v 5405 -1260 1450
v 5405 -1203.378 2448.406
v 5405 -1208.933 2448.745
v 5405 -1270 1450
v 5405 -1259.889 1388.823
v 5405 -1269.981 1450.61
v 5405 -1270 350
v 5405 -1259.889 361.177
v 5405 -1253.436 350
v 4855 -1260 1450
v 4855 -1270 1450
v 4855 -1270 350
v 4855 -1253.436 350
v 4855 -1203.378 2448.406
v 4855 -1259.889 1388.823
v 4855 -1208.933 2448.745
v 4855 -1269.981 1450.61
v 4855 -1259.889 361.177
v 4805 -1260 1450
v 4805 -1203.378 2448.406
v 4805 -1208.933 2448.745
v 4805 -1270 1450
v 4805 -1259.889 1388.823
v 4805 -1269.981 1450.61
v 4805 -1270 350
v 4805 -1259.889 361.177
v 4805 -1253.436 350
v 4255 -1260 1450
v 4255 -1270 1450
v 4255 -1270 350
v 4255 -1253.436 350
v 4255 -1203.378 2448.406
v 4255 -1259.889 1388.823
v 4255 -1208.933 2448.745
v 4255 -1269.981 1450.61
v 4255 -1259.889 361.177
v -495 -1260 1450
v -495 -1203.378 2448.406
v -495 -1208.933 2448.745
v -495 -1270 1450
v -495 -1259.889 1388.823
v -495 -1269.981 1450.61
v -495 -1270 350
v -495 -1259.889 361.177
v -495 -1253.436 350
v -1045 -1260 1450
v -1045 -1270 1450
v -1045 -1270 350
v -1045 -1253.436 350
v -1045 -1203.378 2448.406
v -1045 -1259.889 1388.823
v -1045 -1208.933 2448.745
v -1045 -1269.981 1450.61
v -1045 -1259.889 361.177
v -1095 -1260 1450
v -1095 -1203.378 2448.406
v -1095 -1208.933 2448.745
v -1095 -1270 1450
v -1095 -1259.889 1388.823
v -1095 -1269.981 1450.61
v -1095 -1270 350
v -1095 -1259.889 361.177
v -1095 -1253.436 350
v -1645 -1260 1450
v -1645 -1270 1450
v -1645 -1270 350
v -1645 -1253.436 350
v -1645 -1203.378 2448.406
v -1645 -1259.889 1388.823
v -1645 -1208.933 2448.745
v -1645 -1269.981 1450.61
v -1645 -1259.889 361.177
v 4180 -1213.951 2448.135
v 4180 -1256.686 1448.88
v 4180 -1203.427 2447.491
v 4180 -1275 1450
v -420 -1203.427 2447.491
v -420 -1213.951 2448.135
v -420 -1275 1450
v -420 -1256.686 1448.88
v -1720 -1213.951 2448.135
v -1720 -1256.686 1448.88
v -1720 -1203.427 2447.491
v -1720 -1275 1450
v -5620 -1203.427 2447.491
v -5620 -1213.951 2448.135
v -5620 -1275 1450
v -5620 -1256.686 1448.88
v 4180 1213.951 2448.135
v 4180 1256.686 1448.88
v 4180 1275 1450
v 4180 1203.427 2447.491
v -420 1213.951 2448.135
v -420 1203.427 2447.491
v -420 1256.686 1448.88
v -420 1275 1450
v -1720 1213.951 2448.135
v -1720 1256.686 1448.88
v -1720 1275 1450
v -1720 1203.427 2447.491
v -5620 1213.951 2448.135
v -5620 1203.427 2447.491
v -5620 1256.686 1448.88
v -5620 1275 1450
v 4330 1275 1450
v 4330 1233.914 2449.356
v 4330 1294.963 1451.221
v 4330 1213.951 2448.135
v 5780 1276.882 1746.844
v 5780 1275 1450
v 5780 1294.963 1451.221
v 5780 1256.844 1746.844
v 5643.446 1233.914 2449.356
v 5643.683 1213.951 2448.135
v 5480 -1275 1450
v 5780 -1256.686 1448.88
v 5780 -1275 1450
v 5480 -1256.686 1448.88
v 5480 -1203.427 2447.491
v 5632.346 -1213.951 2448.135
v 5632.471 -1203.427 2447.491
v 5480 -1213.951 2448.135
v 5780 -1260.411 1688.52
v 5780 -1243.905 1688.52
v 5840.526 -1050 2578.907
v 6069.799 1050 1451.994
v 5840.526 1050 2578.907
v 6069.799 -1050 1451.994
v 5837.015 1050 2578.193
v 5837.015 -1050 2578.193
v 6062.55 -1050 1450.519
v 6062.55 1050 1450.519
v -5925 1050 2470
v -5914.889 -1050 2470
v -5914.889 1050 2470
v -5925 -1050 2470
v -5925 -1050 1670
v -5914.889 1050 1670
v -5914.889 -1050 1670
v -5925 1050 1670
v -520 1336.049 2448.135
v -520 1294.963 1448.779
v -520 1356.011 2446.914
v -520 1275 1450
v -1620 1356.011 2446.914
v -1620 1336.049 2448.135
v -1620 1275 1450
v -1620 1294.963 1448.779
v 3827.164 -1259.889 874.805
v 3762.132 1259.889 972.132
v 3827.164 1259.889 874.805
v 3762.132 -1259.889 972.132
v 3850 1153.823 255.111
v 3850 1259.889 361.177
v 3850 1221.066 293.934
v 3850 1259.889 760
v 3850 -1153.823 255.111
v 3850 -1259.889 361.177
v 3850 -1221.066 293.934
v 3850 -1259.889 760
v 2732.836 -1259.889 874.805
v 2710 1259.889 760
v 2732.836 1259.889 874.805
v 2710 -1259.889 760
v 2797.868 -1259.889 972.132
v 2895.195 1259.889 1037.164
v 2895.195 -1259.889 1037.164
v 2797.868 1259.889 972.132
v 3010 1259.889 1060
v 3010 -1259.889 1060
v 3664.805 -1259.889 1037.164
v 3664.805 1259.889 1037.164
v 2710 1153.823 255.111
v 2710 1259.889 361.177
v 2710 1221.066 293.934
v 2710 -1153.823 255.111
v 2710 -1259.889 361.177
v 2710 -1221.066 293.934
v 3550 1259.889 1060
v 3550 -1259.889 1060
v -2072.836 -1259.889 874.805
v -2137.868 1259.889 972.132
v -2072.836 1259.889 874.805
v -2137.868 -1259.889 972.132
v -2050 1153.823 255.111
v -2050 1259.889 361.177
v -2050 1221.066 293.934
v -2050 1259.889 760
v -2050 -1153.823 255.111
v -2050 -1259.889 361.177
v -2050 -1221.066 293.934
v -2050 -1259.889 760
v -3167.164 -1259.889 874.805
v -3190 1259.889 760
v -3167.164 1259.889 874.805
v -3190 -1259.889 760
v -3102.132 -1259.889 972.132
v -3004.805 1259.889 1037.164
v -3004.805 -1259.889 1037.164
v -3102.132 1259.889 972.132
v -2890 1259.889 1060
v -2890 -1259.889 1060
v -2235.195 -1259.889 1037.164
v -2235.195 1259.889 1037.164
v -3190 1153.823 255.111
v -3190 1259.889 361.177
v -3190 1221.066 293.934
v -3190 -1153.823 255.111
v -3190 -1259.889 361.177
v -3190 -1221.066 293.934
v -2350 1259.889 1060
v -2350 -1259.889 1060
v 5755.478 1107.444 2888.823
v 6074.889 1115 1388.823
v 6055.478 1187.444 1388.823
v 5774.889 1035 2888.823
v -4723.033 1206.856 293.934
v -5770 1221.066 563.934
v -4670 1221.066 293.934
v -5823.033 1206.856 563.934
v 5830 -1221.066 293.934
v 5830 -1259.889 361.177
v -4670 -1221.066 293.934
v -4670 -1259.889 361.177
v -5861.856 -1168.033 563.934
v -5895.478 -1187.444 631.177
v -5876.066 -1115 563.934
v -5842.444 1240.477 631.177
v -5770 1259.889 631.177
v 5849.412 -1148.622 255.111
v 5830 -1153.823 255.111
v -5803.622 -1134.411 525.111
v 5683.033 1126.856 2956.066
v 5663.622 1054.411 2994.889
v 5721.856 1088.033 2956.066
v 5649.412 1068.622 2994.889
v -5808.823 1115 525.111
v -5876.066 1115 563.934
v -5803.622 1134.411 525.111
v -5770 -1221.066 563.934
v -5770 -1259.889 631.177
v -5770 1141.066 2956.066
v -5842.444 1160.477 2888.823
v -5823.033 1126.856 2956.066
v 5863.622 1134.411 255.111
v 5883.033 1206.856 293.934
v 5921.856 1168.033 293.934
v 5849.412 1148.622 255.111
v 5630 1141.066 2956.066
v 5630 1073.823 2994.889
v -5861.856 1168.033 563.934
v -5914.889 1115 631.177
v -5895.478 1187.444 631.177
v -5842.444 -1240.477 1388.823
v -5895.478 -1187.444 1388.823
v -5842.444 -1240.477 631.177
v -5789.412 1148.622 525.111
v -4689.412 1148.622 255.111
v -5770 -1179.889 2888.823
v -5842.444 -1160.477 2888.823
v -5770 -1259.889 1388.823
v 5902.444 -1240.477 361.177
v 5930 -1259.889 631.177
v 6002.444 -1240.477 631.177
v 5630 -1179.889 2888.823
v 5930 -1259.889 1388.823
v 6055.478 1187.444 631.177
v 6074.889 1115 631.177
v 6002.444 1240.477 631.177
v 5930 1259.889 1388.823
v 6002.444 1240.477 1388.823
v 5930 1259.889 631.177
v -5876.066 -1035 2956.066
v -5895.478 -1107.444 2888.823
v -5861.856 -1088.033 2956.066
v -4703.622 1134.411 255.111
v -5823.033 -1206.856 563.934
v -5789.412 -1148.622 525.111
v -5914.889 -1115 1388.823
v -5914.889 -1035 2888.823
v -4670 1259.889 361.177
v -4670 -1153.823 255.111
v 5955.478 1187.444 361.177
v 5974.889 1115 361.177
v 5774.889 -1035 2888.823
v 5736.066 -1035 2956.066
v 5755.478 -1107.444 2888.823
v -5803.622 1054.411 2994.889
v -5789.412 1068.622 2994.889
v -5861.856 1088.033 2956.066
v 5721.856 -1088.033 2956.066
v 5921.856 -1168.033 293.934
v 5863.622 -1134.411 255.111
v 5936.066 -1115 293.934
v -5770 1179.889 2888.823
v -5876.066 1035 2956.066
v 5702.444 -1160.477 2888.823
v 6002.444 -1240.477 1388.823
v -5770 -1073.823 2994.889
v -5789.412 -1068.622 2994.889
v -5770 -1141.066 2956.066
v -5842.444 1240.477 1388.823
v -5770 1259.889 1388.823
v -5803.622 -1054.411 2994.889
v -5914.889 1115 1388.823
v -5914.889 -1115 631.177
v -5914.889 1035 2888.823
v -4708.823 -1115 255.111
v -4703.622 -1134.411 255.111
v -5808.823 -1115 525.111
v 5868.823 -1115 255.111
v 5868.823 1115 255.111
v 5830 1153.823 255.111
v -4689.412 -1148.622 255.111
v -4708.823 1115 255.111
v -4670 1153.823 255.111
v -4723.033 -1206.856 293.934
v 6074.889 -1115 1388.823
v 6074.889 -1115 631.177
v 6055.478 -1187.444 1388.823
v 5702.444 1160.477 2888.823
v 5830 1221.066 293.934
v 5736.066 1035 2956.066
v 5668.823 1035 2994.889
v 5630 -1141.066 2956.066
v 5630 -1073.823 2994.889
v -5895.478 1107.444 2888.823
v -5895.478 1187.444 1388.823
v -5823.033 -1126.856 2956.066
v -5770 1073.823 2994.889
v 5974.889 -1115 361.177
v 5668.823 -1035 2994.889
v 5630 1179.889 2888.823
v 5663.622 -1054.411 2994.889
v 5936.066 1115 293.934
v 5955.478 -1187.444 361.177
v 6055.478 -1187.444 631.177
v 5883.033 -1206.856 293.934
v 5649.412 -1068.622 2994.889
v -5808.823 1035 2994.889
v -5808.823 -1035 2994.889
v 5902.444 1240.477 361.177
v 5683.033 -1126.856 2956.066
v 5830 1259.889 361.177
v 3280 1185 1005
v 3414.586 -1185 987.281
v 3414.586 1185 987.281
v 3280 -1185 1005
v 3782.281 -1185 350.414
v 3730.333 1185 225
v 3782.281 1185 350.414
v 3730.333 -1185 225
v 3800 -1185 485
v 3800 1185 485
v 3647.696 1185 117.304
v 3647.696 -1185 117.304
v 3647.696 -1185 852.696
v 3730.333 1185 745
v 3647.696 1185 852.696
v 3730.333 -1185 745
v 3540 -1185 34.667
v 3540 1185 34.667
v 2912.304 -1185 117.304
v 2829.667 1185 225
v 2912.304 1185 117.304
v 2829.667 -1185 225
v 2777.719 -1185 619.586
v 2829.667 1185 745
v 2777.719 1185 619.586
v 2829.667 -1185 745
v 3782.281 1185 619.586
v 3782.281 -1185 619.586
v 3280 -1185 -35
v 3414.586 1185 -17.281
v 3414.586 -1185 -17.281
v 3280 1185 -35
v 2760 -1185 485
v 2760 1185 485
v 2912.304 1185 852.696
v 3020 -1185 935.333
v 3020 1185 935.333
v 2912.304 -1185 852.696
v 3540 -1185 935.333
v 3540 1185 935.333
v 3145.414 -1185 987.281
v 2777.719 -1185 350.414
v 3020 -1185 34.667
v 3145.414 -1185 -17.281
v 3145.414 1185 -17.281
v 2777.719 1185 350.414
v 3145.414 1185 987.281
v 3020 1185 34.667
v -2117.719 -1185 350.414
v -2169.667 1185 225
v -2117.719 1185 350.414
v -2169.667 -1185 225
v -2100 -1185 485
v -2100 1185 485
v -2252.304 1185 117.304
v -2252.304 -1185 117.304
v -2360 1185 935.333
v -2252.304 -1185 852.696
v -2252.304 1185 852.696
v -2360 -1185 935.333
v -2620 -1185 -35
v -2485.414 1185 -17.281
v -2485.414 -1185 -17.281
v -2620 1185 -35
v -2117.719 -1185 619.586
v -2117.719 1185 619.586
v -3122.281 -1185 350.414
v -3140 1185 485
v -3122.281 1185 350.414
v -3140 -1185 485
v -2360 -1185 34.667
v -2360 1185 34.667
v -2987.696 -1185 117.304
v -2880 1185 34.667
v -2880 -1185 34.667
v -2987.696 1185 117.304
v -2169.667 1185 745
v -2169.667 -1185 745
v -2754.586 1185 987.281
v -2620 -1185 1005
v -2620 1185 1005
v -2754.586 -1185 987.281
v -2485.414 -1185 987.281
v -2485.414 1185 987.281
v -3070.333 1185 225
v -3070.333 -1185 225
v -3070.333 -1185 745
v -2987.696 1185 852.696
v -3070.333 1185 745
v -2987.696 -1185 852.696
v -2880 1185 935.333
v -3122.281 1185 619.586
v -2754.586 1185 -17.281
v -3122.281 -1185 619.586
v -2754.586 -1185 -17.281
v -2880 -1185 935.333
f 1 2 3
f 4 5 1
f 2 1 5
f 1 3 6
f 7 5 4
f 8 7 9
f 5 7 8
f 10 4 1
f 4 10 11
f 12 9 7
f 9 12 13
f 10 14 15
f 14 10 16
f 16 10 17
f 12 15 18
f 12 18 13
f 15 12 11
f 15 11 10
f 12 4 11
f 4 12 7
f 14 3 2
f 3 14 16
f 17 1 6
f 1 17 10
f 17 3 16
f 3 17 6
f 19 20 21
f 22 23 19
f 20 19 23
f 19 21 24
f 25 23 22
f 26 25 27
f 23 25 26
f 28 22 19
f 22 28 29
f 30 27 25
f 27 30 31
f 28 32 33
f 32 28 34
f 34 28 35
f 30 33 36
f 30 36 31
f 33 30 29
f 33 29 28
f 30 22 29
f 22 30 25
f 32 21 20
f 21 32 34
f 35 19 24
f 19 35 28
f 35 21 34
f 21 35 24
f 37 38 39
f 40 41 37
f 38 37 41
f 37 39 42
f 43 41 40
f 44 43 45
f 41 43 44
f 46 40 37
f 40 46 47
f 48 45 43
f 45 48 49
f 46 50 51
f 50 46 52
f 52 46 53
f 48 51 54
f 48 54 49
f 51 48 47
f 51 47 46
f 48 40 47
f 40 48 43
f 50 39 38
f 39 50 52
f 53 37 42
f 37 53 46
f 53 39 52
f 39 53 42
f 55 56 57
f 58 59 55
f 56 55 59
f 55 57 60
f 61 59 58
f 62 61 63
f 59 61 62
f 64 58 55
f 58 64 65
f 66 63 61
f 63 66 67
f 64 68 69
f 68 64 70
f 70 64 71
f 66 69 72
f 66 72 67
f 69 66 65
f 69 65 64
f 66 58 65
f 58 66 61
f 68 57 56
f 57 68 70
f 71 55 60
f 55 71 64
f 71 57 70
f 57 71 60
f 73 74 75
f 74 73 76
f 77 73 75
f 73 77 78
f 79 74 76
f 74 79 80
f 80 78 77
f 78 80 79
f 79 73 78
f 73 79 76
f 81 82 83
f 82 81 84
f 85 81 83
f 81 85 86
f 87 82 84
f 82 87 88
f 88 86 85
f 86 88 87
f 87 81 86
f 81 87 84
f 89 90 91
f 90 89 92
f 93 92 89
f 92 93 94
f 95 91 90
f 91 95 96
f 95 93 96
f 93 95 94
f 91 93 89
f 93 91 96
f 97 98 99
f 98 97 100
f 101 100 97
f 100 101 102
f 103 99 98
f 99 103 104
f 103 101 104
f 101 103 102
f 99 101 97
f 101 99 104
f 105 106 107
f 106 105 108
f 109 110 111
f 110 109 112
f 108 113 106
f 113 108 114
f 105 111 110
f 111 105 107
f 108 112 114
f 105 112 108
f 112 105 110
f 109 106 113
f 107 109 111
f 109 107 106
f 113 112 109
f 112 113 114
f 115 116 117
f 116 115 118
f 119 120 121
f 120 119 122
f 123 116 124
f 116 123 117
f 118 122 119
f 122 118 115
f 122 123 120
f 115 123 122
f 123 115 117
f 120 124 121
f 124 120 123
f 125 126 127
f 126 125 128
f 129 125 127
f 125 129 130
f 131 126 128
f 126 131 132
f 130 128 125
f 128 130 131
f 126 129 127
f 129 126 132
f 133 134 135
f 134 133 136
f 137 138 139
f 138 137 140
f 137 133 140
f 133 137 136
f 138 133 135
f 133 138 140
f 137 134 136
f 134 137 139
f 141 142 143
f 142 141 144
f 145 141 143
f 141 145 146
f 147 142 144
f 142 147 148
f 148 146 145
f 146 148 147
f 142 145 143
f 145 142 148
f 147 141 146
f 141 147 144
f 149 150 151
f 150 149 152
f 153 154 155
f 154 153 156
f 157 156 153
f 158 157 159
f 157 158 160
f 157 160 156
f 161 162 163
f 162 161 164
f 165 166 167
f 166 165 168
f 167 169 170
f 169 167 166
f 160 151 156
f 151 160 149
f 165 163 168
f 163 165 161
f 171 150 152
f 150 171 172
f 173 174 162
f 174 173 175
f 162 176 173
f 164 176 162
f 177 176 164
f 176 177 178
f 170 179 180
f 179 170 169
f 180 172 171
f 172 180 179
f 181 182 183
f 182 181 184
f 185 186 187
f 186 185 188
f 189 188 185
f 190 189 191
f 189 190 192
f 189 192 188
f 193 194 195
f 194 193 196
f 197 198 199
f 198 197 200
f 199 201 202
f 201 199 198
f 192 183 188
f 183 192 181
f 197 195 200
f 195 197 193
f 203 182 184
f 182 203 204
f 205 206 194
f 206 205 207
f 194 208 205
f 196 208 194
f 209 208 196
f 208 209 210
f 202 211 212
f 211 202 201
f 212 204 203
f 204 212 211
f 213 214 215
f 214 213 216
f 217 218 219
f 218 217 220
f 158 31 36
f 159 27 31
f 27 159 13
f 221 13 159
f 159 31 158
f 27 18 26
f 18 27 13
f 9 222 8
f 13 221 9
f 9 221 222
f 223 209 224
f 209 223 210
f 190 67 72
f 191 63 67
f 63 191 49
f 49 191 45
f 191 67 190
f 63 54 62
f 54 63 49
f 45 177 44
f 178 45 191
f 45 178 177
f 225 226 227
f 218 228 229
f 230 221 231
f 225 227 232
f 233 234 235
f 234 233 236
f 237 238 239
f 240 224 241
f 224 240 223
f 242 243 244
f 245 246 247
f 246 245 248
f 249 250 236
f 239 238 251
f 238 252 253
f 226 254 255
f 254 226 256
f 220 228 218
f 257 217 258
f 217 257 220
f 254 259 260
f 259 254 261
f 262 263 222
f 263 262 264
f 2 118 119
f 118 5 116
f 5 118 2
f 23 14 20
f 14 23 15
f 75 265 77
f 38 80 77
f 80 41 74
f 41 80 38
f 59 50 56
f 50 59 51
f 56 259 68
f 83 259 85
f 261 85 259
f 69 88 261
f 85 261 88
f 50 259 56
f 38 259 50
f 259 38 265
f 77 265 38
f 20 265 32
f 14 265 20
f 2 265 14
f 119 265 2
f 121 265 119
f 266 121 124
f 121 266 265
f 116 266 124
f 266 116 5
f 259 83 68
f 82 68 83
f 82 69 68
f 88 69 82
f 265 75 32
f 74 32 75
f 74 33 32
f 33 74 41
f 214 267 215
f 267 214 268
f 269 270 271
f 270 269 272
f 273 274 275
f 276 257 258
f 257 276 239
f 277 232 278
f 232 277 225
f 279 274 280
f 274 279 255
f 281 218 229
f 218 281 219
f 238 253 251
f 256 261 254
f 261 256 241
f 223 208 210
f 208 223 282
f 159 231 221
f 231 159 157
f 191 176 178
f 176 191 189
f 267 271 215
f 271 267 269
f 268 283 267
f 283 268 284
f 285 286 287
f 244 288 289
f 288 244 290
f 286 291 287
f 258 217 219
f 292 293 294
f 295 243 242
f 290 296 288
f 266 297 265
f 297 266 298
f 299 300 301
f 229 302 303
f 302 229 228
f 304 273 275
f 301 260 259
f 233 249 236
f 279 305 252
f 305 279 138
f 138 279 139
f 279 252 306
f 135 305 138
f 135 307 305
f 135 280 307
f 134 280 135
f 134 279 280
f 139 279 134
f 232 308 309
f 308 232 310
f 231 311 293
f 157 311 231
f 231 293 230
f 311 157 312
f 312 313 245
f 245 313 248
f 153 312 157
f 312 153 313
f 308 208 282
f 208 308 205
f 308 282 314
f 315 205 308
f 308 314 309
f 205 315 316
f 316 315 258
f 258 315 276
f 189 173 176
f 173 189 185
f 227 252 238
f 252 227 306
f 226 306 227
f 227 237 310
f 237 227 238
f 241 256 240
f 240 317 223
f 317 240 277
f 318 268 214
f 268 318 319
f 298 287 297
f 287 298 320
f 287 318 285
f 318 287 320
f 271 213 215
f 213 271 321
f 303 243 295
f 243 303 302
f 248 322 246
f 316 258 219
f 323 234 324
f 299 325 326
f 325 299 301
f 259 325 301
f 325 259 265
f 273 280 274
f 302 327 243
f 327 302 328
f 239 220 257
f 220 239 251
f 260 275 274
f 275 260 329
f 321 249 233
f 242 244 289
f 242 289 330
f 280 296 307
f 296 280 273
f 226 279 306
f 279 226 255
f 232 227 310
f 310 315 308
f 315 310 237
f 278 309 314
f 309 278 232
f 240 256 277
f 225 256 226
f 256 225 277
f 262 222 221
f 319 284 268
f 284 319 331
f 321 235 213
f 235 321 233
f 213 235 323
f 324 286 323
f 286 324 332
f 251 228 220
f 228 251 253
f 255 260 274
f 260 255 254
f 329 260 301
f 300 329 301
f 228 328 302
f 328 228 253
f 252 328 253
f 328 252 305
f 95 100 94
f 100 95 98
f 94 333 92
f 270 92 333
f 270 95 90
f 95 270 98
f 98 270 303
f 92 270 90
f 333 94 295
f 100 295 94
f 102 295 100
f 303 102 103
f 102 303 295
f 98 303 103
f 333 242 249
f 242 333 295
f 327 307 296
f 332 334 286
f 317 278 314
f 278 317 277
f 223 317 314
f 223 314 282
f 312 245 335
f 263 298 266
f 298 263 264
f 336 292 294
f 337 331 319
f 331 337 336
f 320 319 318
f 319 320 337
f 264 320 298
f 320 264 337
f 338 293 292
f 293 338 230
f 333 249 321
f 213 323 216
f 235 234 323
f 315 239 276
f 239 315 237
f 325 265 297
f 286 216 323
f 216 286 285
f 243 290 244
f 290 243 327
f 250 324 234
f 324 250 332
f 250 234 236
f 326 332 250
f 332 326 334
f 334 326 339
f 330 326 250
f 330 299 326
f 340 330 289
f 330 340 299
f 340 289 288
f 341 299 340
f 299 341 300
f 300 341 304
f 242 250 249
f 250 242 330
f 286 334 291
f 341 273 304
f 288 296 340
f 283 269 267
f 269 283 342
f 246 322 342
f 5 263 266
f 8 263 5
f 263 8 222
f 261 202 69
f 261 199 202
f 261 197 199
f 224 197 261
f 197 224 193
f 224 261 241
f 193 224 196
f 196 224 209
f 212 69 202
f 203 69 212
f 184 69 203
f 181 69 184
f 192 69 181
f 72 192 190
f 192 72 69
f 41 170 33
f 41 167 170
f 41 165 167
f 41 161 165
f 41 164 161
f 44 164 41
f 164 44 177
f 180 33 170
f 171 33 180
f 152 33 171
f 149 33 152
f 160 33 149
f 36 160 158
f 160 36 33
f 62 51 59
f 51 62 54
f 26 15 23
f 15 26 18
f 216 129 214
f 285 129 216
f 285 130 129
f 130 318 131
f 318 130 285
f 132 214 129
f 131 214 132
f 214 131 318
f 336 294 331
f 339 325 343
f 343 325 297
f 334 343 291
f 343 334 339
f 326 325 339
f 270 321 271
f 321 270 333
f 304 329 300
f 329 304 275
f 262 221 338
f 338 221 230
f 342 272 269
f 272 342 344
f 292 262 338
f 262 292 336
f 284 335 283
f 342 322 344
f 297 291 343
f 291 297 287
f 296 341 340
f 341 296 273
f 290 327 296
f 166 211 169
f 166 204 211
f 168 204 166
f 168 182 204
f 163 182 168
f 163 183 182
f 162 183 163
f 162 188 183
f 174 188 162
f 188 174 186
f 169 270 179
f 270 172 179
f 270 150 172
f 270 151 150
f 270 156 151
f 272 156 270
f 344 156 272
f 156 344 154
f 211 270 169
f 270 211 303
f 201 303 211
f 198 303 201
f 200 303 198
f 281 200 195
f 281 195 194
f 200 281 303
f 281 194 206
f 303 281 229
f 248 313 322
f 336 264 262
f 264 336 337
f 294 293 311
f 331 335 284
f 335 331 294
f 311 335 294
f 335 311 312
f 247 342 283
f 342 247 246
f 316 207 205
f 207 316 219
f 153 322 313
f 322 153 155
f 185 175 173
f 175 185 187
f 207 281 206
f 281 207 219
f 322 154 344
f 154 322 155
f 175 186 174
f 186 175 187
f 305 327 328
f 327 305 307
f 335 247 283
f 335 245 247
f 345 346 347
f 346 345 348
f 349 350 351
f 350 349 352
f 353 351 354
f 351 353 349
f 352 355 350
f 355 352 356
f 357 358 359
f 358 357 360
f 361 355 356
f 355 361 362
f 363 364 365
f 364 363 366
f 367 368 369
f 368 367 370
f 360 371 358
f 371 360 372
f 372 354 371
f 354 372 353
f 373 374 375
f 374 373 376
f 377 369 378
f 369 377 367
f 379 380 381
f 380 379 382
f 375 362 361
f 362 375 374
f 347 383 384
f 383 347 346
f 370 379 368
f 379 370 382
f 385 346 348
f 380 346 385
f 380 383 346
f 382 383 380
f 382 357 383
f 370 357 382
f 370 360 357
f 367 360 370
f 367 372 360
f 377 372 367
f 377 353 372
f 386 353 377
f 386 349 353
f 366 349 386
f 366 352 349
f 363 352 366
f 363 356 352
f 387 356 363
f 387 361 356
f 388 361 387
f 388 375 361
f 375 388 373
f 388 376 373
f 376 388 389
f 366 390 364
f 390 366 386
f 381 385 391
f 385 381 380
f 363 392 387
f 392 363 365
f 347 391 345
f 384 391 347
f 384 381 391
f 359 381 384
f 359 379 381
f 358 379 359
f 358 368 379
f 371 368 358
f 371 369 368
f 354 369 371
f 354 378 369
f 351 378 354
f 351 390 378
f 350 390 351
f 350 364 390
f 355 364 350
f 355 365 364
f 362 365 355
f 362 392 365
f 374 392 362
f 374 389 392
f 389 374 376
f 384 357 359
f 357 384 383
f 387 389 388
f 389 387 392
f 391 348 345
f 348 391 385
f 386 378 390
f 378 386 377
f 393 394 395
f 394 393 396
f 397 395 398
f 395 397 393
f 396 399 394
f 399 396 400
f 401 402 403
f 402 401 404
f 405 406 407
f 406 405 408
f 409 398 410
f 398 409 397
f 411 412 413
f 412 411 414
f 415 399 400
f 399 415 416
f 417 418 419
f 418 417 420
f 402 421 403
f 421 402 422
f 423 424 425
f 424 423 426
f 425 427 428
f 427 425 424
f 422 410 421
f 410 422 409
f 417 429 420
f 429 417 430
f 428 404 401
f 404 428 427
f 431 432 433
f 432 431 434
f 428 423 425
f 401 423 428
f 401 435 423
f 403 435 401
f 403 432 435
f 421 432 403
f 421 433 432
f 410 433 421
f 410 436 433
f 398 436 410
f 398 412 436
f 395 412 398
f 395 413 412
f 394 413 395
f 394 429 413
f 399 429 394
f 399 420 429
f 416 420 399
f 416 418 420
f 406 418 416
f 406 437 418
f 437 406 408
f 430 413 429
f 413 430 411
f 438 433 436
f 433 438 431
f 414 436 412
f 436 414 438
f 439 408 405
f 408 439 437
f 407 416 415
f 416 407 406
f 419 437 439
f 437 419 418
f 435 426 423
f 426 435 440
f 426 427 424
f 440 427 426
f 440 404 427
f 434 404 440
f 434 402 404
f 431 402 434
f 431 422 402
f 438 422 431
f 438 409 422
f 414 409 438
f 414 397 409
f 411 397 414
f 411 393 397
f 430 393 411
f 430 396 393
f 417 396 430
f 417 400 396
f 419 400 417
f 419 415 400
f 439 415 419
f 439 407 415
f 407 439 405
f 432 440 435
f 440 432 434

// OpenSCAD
// Protected crossing design
// Copyright 2018 Pierre ROUZEAU AKA PRZ
// Program license GPL v3
// documentation licence cc BY-SA 4.0 and GFDL 1.2
include <Z_library.scad>

part=0;

//Front wheel x position
xfrontw= 3280;
//Bus length
length = 12000;
//Bus width
width = 2530;
//Main bus height
busht=3000;
//Wheel base
wheelbase = 5900;
//Front cantilever
frontcant = 2800; 
//Height of median line
midht = 1350;
//ground clearance
groundclear = 250;

if (part==1)
	bus();
else if (part==2)
	glass();
else if (part==3)
	tires();
else {
	color(glass_color) glass();
	red() bus();
	black() tires();
}

glass_color = [128,128,128,180]/256;

//Back cantilever - unused
backcant = length-wheelbase-frontcant;

*t(0,1380,-30) 
						scale(1595) 
							import("Bus_by_Anderson_Rondon.stl");

module bus () {
	sphd = 300;
	sphr = sphd/2;
	diff() {
		hull() {
			// bus bottom
			duplx(-length+1500) 
				bcyl(xfrontw+frontcant-sphr-100,sphr+groundclear);
			duplx(-length+sphd) 
				bcyl(xfrontw+frontcant-sphr,sphr+520);
			duplx(-length+sphd) 
				bcyl(xfrontw+frontcant-sphr,midht);
			duplx(-length+sphd+300) 
				bcyl(xfrontw+frontcant-sphr-300,busht-sphr,80);
		}
		//:::  Remove wheel place
		duplx (-wheelbase)
		  hull()
				t(xfrontw,0,500) 
					dmirrorx() dmirrorz()
						cyly (-600,3000, 270,0,260, 16);
  }
	module bcyl(x,z, mw=0) {
	  wdx = width/2-sphr;
		dmirrory()
			t(x,wdx-mw,z)
				sphere(sphr, $fn=12);
	}	
}	
//size control
//blue() cyly (-300,2550, 0,0,1500);
//blue() cylx (300,12020, -5920,0,1300);

module glass (){
	//front glass
	t(xfrontw+frontcant-20,0,1450)
	  r(0,-11.5)
			cubez(20,2100,1150);	
	//back glass
	t(xfrontw+frontcant-length+5,0,1670)
		cubez(20,2100,800);
	//door glasses
	duplx (-wheelbase)
	t(xfrontw+frontcant-950,-width/2+5,350)
		duplx(-600) {
			cubez(550,20,1100);
			tslz (1100)
			  r(-3.5)
			    cubez(550,20,1000);
		}	
	//side glasses	
	dmirrory() {
		t(xfrontw+frontcant-1900,-width/2-10,1450)
					r(-3.5)
						cubex(-wheelbase+1300,20,1000,0,10,500);	
		t(xfrontw+frontcant-1900-wheelbase,-width/2-10,1450)
			r(-3.5)
				cubex(-length+wheelbase+2200,20,1000,0,10,500);	
	}	
	//driver glass
	t(xfrontw+frontcant-1750,width/2+10,1450)
	  diff() {        
		  r(3.5)
				cubex(1450,20,1000,0,10,500);	
			r(0,-11)
				cubex(400,400,1600, 1480,10,500);
		}	
	//side front glass
	t(xfrontw+frontcant-1350+750,-width/2-10,1450)
	  diff() {        
		  r(-3.5)
				cubex(300,20,1000,0,10,500);	
			r(0,-11)
				cubex(800,400,1600, 340,10,500);
		}	
	//middle glass, driver side
		t(xfrontw+frontcant-1900-wheelbase,width/2+10,1450)
			r(-3.5)
				cubex(1100,20,1000,100,10,500);	
} 

module tires() {
	tirede = 1040;
	duplx(-wheelbase) 
	  cyly (-tirede,2370, xfrontw,0,tirede/2-35, 24);
}
